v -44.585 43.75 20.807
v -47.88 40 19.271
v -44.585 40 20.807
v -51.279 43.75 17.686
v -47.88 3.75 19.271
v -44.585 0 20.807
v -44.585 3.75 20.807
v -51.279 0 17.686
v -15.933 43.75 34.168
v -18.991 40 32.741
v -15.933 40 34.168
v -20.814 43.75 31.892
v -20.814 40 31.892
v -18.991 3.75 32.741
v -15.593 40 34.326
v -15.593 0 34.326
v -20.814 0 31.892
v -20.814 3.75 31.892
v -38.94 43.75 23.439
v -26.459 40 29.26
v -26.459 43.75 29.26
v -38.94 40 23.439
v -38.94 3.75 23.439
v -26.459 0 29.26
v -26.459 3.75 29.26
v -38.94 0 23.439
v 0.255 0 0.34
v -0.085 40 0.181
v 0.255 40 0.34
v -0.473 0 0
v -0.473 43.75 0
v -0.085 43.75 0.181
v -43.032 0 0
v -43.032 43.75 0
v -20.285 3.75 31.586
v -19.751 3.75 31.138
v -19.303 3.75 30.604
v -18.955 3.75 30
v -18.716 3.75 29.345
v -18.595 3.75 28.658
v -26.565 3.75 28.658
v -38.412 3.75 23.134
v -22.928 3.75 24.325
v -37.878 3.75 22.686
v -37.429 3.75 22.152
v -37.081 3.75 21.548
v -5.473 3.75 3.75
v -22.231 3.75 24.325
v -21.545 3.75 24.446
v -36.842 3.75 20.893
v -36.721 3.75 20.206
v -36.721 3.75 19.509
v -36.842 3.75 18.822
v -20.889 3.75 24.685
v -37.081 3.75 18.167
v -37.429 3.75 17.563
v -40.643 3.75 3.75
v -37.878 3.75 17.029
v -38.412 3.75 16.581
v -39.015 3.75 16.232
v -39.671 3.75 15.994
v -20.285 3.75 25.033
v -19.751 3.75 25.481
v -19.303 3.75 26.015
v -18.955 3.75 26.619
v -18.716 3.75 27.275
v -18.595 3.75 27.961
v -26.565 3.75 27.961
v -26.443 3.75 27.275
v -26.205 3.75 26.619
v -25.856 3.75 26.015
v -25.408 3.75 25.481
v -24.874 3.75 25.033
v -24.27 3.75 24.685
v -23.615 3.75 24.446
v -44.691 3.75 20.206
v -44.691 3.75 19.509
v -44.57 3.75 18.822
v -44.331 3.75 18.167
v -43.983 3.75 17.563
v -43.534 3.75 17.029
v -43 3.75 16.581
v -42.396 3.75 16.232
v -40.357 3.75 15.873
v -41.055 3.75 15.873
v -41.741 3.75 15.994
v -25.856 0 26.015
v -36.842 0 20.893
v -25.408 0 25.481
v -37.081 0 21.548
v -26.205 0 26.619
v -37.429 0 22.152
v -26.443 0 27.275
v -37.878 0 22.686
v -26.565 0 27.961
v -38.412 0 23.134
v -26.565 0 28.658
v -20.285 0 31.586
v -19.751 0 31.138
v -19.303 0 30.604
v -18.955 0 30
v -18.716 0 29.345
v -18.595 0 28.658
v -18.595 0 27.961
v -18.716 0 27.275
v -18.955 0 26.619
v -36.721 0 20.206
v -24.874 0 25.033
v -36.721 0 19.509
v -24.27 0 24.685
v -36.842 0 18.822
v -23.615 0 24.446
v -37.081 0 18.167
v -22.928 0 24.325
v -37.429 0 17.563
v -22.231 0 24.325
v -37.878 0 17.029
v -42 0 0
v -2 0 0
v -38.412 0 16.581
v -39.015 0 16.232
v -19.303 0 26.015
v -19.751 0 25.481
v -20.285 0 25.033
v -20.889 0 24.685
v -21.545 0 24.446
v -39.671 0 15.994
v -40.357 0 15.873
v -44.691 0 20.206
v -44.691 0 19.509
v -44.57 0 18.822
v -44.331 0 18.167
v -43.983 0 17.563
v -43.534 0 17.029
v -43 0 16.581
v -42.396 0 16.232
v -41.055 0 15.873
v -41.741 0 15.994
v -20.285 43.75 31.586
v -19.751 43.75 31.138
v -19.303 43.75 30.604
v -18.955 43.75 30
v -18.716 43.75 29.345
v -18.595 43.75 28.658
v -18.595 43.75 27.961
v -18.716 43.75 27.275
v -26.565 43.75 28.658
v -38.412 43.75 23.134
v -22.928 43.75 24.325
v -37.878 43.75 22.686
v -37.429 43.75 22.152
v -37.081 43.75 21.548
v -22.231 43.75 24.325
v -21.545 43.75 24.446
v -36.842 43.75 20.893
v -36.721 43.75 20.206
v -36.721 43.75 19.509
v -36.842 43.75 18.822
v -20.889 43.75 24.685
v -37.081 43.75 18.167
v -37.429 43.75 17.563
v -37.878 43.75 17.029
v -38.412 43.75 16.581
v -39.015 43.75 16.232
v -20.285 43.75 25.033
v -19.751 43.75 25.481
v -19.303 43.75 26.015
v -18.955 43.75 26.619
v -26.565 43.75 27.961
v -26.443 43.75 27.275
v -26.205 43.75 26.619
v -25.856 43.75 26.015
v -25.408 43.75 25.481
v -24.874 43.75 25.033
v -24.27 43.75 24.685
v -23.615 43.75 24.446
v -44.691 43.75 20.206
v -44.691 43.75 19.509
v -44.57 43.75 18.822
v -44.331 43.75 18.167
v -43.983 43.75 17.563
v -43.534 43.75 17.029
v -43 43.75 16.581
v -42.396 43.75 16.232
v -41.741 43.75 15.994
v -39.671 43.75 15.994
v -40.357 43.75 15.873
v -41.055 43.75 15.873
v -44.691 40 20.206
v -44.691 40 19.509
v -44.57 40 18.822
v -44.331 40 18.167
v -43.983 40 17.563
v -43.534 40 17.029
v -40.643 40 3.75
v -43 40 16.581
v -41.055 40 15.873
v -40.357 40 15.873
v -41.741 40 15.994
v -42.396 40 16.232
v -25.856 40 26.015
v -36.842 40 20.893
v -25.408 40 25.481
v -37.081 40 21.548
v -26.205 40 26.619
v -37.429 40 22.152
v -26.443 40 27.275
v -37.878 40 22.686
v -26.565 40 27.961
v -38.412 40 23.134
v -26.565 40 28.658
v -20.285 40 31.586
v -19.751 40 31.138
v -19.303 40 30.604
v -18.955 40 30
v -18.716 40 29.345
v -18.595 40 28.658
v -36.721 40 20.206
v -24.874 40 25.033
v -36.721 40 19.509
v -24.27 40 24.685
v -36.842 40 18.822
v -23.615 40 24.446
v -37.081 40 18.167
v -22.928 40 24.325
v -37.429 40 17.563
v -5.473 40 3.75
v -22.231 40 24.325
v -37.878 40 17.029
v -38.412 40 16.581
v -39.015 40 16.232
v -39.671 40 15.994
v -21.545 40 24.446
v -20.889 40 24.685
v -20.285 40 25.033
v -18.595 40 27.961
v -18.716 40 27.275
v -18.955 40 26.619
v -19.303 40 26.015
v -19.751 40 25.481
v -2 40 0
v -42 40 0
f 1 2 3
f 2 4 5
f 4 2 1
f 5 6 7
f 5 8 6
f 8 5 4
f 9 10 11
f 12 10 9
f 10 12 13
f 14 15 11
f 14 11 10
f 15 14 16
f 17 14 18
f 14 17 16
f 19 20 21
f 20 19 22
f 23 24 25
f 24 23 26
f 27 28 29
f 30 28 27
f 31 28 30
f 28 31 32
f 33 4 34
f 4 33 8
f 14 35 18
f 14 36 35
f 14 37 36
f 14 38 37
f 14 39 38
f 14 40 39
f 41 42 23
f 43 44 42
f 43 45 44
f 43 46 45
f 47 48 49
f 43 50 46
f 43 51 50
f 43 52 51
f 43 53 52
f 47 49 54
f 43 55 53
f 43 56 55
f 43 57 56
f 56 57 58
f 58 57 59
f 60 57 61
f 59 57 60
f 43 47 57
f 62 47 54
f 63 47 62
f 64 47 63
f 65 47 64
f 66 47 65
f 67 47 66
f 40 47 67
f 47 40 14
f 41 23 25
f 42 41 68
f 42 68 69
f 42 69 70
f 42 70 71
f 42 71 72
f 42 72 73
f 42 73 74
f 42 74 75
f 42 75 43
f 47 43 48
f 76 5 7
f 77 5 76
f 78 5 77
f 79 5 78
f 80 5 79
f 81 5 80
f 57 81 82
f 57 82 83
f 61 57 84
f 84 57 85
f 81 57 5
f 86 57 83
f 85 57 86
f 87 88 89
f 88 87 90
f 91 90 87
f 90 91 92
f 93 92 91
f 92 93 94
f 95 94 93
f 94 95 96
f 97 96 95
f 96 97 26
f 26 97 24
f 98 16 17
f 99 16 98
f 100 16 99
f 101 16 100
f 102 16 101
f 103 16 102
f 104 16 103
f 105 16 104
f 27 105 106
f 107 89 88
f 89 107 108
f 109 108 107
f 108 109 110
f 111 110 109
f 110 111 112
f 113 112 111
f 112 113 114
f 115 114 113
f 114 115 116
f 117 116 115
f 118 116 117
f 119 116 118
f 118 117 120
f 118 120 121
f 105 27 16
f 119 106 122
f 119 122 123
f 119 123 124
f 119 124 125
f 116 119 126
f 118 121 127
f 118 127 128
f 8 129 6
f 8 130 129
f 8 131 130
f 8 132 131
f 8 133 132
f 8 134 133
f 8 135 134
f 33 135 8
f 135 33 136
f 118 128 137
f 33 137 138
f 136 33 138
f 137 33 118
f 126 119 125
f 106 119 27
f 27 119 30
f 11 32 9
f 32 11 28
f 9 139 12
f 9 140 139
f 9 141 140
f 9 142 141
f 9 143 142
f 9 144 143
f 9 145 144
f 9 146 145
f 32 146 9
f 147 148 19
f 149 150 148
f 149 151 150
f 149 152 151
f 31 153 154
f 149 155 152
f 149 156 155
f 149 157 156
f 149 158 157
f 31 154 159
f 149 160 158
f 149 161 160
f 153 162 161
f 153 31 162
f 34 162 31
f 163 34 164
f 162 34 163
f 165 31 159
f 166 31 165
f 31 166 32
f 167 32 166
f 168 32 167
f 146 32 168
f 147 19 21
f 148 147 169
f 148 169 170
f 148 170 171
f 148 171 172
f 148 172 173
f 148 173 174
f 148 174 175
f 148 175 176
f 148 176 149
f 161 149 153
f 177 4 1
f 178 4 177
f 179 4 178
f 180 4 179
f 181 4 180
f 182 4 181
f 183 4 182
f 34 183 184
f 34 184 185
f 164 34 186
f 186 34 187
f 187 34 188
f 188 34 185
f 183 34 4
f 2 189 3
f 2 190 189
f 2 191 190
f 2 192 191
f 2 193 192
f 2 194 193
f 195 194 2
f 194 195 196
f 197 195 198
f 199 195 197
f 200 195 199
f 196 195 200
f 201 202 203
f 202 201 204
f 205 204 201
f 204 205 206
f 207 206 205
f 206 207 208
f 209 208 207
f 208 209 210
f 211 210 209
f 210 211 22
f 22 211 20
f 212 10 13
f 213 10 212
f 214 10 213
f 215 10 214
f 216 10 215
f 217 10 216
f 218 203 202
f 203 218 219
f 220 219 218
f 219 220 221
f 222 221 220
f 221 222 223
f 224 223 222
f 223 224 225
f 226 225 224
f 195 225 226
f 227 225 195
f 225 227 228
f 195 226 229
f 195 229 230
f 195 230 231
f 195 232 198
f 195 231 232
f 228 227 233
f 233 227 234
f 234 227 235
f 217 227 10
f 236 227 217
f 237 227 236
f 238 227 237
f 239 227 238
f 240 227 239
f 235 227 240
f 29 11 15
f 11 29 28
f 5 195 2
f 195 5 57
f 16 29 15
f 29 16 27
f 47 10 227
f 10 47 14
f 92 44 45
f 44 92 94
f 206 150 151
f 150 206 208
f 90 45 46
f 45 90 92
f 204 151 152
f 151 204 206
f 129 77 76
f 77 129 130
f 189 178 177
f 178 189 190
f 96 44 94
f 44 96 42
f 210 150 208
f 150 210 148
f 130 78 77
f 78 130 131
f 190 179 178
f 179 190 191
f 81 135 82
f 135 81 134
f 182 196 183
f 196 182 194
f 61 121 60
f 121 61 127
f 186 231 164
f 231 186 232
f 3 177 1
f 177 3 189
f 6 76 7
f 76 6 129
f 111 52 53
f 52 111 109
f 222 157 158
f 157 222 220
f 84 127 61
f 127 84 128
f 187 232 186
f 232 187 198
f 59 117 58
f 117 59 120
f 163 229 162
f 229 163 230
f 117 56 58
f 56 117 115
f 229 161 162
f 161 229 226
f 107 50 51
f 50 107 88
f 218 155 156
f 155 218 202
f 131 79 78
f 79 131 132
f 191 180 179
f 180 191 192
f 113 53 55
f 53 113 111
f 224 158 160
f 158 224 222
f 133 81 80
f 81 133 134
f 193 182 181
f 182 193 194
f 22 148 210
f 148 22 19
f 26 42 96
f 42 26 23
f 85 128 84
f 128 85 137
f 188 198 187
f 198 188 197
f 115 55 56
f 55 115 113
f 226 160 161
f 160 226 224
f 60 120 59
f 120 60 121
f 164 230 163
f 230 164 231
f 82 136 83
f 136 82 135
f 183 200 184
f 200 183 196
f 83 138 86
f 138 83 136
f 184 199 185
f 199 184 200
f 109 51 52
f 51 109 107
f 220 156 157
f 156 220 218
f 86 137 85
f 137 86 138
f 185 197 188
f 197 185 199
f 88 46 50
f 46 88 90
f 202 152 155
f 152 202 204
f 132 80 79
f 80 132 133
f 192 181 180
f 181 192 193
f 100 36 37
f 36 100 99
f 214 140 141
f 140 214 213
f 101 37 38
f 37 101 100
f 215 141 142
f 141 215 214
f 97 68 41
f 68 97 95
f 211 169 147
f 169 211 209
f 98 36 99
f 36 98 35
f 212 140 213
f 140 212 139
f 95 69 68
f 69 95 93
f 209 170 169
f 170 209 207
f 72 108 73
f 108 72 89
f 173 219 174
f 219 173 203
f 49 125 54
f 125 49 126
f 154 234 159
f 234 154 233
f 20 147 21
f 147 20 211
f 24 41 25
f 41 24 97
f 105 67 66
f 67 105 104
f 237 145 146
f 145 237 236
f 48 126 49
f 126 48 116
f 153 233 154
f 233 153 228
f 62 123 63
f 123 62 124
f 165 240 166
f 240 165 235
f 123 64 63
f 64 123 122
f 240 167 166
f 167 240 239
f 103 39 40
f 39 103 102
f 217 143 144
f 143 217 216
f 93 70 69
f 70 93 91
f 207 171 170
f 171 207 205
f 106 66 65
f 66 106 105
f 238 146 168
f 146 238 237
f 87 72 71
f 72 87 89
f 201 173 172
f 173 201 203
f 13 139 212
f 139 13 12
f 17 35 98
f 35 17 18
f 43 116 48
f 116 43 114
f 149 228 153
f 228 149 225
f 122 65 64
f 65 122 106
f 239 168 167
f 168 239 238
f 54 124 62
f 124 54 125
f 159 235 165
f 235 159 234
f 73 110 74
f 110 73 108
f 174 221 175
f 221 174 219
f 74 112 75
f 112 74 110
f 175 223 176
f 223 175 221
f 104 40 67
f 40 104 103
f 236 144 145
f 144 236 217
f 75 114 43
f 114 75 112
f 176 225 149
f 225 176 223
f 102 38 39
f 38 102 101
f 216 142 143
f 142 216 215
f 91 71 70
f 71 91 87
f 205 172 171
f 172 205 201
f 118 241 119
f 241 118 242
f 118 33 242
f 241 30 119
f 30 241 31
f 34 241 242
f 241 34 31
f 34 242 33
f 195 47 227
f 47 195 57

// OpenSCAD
//color("red") import ("Switch_M.stl", convexity = 5);
union() {
    translate([-2,0,0]) rotate([0,0,90]) cube([40,40,3.75]);
	difference() {
		rotate([0,-25,0]) translate([-39,0,0.2]) {
		    difference() {
		     union() {
			    cube([39, 3.75, 37.5]);
			    translate([0,40,0]) cube([39, 3.75, 37.5]);
			    cube([3.75, 40, 37.5]);
			    translate([37.5-3.75/2,0,0]) cube([3.75, 40, 37.5]);
			  }
			  translate([10.5,60,35]) rotate([90,0,0]) cylinder(h=80, r=4, $fn=36);
			  translate([30.5,60,35]) rotate([90,0,0]) cylinder(h=80, r=4, $fn=36);
			}
		}
		translate([5,-5,0]) rotate([0,180,0]) cube([50,60,20]);
	}
}
